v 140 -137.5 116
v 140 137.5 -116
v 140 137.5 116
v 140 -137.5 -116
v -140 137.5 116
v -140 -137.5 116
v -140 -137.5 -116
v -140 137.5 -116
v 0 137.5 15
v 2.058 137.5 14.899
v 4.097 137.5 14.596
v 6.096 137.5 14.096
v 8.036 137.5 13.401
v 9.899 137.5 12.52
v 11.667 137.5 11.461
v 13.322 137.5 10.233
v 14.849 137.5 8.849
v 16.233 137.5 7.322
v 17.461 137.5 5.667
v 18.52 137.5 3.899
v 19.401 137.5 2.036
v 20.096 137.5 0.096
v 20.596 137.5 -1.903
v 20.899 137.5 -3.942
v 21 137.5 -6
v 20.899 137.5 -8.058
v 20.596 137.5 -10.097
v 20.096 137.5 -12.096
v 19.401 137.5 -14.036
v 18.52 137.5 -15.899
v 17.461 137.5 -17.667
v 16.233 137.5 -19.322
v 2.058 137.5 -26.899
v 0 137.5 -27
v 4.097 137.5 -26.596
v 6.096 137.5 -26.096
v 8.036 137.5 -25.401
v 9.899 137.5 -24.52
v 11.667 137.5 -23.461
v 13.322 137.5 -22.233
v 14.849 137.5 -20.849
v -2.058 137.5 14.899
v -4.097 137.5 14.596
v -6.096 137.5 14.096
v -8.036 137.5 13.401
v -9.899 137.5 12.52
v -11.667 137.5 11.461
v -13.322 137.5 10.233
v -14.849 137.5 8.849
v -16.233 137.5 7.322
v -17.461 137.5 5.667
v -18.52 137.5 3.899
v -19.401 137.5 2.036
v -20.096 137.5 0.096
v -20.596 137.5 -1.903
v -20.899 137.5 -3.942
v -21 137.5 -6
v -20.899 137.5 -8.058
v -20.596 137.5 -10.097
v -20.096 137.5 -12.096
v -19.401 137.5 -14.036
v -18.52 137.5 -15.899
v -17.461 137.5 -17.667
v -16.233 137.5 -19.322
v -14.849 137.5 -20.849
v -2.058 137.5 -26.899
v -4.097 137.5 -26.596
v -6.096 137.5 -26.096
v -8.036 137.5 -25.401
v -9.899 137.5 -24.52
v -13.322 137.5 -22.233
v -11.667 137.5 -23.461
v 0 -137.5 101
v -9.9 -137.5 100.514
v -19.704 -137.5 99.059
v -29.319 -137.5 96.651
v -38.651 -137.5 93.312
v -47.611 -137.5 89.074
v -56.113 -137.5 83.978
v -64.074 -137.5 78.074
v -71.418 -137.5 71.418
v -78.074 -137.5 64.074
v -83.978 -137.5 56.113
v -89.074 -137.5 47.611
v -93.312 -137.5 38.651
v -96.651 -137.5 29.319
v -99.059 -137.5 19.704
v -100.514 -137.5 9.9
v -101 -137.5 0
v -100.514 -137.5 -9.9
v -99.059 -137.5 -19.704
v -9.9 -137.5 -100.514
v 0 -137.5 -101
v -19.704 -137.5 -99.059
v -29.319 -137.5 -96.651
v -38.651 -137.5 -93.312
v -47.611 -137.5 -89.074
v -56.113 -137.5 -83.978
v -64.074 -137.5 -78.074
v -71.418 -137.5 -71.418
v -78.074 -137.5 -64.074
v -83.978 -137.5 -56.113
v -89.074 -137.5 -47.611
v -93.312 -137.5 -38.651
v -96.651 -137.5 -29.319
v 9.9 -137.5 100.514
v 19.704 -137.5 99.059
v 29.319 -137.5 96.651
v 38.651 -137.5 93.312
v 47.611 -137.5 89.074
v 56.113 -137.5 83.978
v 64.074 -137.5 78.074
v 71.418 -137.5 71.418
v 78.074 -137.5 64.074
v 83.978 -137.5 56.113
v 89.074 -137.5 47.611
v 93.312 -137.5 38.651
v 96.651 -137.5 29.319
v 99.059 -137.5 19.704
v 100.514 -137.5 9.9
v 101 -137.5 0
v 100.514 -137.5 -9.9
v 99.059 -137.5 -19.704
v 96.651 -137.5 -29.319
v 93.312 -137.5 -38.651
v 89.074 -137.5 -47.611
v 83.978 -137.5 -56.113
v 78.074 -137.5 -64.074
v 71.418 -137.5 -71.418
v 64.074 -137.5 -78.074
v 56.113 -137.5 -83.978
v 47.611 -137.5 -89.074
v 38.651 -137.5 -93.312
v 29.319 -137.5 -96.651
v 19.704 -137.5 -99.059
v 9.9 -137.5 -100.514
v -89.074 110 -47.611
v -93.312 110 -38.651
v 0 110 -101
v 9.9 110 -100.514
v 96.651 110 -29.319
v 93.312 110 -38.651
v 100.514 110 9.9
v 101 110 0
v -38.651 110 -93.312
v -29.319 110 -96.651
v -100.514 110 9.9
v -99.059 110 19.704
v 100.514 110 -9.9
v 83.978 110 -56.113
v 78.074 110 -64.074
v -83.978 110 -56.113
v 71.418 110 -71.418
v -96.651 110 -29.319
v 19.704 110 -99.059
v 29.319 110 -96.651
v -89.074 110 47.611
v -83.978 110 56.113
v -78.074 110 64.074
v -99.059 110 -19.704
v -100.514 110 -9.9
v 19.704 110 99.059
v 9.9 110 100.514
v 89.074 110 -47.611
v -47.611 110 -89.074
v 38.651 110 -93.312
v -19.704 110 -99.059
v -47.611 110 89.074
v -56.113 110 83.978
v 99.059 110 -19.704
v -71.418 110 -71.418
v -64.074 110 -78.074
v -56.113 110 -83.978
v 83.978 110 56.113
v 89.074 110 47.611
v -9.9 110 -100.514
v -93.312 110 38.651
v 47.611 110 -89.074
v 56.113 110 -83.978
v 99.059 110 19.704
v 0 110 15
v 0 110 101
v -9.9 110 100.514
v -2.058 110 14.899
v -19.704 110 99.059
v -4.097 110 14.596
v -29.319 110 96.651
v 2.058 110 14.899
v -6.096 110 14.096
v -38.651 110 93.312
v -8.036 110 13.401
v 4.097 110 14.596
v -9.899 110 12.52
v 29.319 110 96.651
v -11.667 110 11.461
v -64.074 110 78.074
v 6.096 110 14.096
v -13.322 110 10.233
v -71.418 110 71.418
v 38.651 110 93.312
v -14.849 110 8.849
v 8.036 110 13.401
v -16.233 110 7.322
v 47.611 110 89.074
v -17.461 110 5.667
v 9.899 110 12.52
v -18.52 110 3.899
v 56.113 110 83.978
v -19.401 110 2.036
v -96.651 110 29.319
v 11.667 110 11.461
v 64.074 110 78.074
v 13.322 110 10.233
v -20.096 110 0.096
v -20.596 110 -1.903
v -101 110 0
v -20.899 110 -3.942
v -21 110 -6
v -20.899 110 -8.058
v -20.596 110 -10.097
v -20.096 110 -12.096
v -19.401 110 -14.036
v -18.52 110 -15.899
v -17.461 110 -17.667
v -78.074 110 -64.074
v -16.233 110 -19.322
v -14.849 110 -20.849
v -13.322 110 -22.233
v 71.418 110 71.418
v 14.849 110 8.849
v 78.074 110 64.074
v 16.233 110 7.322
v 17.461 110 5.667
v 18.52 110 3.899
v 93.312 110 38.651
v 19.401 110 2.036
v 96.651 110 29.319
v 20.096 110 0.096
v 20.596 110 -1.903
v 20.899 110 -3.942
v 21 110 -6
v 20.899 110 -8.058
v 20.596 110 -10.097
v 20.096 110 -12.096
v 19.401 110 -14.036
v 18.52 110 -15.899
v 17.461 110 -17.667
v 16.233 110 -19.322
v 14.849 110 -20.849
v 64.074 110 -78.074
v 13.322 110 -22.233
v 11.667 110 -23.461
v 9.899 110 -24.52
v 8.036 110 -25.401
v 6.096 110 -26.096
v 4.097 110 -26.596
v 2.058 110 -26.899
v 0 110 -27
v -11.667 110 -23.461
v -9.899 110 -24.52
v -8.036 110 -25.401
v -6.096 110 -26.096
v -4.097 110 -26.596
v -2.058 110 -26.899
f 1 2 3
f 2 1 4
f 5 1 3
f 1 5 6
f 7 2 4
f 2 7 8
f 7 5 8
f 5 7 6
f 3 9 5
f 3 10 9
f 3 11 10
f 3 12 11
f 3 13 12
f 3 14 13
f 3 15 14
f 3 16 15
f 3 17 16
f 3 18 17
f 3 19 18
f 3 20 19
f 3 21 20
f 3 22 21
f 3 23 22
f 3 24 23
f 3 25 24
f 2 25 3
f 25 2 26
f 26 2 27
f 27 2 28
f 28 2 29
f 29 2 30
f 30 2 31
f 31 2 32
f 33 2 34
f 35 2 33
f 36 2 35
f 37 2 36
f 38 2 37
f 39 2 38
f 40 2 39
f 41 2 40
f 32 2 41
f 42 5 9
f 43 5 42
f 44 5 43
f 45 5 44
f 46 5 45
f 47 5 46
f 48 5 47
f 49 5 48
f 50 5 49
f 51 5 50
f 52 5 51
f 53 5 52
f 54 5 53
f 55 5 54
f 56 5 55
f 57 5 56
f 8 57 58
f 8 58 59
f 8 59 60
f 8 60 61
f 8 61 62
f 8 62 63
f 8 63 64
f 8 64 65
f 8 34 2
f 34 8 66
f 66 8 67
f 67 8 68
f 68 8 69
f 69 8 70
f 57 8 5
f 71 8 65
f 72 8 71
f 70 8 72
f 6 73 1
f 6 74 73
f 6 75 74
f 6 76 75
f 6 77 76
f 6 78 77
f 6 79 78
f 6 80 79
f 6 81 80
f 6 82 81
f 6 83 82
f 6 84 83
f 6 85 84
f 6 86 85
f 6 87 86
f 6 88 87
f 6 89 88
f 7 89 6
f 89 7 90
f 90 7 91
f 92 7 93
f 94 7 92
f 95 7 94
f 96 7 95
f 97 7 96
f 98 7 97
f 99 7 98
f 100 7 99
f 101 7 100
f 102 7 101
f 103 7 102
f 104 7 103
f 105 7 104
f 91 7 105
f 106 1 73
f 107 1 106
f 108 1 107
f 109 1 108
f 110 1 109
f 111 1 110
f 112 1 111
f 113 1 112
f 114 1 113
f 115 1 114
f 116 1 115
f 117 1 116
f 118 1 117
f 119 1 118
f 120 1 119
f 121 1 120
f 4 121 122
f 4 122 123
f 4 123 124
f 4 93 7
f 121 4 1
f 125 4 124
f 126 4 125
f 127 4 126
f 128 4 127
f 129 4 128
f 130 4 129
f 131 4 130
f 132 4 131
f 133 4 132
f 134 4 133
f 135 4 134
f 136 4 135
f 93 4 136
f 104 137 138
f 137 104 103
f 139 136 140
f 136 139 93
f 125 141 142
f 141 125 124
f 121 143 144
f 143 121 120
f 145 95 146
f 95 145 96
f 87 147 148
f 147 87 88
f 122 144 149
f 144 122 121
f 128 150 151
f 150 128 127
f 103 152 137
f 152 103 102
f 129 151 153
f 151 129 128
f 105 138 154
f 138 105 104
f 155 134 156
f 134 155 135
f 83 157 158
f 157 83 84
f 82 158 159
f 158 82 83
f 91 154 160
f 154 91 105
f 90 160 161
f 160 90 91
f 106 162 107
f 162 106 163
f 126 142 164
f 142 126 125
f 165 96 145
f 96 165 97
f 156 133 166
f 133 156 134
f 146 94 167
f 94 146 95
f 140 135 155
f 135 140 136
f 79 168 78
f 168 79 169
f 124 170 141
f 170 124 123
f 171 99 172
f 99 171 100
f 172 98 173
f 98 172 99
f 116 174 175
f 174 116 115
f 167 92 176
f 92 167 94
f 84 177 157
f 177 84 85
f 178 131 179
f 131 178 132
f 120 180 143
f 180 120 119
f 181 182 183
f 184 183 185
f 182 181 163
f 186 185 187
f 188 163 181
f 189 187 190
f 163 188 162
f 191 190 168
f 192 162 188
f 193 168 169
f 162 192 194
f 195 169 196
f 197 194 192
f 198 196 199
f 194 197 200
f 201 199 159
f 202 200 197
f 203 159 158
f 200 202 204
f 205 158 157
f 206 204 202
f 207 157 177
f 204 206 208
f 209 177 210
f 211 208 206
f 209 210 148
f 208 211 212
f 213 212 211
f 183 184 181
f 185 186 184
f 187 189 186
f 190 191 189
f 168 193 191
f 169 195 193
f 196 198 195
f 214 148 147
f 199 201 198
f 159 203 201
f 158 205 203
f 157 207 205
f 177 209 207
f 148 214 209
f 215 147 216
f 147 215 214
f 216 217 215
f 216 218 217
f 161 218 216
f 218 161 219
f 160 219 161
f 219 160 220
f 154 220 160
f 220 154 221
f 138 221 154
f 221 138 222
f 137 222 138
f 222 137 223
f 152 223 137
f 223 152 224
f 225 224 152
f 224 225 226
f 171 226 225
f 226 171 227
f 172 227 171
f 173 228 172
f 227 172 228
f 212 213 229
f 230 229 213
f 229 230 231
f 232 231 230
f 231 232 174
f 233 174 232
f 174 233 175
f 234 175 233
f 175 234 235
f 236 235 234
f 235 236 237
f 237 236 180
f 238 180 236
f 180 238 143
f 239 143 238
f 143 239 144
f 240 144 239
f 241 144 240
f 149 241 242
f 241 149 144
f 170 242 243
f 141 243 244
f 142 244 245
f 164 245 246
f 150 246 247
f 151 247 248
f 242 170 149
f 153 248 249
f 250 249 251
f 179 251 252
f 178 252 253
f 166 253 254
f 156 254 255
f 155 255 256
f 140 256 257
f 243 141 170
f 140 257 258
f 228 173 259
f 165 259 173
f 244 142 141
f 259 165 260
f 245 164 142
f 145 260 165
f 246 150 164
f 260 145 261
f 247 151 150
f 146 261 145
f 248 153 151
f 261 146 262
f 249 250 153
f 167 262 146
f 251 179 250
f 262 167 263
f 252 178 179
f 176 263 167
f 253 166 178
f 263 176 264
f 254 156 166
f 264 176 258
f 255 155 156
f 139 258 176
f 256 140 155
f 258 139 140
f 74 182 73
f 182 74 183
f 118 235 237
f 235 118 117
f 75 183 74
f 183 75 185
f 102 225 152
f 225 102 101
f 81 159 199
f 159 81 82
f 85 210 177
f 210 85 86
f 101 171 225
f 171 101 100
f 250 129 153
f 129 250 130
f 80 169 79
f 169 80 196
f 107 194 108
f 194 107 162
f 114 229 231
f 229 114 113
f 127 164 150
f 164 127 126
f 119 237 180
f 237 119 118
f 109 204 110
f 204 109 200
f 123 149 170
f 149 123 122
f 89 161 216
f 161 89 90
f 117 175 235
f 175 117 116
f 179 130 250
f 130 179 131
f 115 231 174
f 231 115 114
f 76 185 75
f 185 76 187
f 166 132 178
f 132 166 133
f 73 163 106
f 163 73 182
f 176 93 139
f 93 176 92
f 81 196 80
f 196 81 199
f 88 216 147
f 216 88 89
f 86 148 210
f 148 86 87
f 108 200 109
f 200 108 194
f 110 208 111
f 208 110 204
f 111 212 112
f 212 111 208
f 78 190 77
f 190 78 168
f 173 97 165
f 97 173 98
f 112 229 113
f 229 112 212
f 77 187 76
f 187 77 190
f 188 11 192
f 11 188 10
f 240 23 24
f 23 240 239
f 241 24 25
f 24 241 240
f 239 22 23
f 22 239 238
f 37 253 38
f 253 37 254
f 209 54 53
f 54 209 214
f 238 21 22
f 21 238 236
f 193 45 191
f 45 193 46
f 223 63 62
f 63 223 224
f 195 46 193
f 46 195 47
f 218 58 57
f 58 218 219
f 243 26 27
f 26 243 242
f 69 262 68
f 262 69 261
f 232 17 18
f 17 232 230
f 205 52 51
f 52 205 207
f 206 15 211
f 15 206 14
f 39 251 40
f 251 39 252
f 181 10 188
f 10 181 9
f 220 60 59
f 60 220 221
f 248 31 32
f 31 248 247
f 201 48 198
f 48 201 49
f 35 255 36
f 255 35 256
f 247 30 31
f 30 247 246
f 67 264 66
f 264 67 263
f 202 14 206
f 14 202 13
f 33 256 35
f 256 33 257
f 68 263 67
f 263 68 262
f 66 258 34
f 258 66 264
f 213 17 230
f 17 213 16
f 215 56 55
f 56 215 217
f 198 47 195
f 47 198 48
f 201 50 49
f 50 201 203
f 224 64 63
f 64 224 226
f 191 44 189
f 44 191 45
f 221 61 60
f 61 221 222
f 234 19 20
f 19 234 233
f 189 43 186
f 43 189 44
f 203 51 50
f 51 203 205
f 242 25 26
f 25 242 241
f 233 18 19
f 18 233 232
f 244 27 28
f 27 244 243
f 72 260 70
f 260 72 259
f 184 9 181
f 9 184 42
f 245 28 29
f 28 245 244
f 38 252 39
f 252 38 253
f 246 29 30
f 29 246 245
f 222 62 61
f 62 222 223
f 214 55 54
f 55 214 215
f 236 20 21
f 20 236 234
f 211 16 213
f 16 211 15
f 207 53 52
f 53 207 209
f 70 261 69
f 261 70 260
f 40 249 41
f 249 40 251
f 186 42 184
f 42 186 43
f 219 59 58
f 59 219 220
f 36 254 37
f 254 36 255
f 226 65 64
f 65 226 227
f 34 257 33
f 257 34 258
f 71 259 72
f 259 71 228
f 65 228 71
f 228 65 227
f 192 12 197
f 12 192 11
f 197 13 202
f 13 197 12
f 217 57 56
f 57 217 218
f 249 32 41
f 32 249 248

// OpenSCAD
// ============================================================================
// Atom Lithography Machine — Parametric OpenSCAD Module (S7.SAFETY-02)
// ============================================================================
// part_id           : S7.SAFETY-02
// parent_bom_id     : S7.SAFETY
// subsystem         : S7
// part_name         : ANSI Z136.1 OD>=8 (808 nm) Kilitli Sinif-1 3 mm Celik Lazer+X-Isini Kilifi & Cift-Kanalli SIL-3 Mekanik Perde (<5 ms, Exp150, 38.0 kg)
// material          : 316L
// temp_stage        : 300 K (S5.5 +Y cevre)
// vacuum_grade      : Atmosfer
// tolerance         : OD>=8, <0.01 uSv/h, <5 ms
// computed_mass_kg  : 38.00000
// envelope_mm       : 280.000 x 279.800 x 250.200
// design_maturity   : M0_M1_DETAILED_CAD_DESIGN_ONLY
// no_lab_measurement: true
// iec61508_certified: false
// semi_s2_certified : false
// Units: millimeters (mm)
// ============================================================================

$fn = 64;

// Nominal bounding envelope parameters (mm)
bbox_x = 280.0000;
bbox_y = 279.8000;
bbox_z = 250.2000;

// Part-specific parametric dimensions
shroud_w_mm = 280.0;
shroud_d_mm = 260.0;
shroud_h_mm = 232.0;
min_316l_wall_mm = 3.0;
cavity_w_mm = 164.0;

// Interface / port parameters (mm)
port_s55_viewport_shroud_mate_od = 113.500;
port_s55_viewport_shroud_mate_bore = 63.500;
port_s55_viewport_shroud_mate_pcd = 92.100;
port_s55_viewport_shroud_mate_bolts = 8;
port_fiber_labyrinth_port_od = 56.000;
port_fiber_labyrinth_port_bore = 36.000;

module part_S7_SAFETY_02() {
  difference() {
    union() {
      // 3 mm+ 316L OD>=8 laser & X-ray shroud
      cube([280.000, 275.000, 232.000], center=true);
    }
    // Open S5.5 optical head clearance cavity
    translate([0.000, -15.000, 0.000]) rotate([90.000, 0.000, 0.000]) {
      hull() {
        translate([-0.000, 0, 0]) cylinder(d=202.000, h=250.000, center=true);
        translate([0.000, 0, 0]) cylinder(d=202.000, h=250.000, center=true);
      }
    }
    // Rear armored 808 nm fiber labyrinth port
    translate([0.000, 130.000, -6.000]) rotate([90.000, 0.000, 0.000]) cylinder(d=42.000, h=40.000, center=true);
  }
}

// World assembly mounting transform (global machine frame, mm / deg):
// translate([0.000, 485.000, 506.000]) rotate([0.000, 0.000, 0.000]) part_S7_SAFETY_02();

part_S7_SAFETY_02();
